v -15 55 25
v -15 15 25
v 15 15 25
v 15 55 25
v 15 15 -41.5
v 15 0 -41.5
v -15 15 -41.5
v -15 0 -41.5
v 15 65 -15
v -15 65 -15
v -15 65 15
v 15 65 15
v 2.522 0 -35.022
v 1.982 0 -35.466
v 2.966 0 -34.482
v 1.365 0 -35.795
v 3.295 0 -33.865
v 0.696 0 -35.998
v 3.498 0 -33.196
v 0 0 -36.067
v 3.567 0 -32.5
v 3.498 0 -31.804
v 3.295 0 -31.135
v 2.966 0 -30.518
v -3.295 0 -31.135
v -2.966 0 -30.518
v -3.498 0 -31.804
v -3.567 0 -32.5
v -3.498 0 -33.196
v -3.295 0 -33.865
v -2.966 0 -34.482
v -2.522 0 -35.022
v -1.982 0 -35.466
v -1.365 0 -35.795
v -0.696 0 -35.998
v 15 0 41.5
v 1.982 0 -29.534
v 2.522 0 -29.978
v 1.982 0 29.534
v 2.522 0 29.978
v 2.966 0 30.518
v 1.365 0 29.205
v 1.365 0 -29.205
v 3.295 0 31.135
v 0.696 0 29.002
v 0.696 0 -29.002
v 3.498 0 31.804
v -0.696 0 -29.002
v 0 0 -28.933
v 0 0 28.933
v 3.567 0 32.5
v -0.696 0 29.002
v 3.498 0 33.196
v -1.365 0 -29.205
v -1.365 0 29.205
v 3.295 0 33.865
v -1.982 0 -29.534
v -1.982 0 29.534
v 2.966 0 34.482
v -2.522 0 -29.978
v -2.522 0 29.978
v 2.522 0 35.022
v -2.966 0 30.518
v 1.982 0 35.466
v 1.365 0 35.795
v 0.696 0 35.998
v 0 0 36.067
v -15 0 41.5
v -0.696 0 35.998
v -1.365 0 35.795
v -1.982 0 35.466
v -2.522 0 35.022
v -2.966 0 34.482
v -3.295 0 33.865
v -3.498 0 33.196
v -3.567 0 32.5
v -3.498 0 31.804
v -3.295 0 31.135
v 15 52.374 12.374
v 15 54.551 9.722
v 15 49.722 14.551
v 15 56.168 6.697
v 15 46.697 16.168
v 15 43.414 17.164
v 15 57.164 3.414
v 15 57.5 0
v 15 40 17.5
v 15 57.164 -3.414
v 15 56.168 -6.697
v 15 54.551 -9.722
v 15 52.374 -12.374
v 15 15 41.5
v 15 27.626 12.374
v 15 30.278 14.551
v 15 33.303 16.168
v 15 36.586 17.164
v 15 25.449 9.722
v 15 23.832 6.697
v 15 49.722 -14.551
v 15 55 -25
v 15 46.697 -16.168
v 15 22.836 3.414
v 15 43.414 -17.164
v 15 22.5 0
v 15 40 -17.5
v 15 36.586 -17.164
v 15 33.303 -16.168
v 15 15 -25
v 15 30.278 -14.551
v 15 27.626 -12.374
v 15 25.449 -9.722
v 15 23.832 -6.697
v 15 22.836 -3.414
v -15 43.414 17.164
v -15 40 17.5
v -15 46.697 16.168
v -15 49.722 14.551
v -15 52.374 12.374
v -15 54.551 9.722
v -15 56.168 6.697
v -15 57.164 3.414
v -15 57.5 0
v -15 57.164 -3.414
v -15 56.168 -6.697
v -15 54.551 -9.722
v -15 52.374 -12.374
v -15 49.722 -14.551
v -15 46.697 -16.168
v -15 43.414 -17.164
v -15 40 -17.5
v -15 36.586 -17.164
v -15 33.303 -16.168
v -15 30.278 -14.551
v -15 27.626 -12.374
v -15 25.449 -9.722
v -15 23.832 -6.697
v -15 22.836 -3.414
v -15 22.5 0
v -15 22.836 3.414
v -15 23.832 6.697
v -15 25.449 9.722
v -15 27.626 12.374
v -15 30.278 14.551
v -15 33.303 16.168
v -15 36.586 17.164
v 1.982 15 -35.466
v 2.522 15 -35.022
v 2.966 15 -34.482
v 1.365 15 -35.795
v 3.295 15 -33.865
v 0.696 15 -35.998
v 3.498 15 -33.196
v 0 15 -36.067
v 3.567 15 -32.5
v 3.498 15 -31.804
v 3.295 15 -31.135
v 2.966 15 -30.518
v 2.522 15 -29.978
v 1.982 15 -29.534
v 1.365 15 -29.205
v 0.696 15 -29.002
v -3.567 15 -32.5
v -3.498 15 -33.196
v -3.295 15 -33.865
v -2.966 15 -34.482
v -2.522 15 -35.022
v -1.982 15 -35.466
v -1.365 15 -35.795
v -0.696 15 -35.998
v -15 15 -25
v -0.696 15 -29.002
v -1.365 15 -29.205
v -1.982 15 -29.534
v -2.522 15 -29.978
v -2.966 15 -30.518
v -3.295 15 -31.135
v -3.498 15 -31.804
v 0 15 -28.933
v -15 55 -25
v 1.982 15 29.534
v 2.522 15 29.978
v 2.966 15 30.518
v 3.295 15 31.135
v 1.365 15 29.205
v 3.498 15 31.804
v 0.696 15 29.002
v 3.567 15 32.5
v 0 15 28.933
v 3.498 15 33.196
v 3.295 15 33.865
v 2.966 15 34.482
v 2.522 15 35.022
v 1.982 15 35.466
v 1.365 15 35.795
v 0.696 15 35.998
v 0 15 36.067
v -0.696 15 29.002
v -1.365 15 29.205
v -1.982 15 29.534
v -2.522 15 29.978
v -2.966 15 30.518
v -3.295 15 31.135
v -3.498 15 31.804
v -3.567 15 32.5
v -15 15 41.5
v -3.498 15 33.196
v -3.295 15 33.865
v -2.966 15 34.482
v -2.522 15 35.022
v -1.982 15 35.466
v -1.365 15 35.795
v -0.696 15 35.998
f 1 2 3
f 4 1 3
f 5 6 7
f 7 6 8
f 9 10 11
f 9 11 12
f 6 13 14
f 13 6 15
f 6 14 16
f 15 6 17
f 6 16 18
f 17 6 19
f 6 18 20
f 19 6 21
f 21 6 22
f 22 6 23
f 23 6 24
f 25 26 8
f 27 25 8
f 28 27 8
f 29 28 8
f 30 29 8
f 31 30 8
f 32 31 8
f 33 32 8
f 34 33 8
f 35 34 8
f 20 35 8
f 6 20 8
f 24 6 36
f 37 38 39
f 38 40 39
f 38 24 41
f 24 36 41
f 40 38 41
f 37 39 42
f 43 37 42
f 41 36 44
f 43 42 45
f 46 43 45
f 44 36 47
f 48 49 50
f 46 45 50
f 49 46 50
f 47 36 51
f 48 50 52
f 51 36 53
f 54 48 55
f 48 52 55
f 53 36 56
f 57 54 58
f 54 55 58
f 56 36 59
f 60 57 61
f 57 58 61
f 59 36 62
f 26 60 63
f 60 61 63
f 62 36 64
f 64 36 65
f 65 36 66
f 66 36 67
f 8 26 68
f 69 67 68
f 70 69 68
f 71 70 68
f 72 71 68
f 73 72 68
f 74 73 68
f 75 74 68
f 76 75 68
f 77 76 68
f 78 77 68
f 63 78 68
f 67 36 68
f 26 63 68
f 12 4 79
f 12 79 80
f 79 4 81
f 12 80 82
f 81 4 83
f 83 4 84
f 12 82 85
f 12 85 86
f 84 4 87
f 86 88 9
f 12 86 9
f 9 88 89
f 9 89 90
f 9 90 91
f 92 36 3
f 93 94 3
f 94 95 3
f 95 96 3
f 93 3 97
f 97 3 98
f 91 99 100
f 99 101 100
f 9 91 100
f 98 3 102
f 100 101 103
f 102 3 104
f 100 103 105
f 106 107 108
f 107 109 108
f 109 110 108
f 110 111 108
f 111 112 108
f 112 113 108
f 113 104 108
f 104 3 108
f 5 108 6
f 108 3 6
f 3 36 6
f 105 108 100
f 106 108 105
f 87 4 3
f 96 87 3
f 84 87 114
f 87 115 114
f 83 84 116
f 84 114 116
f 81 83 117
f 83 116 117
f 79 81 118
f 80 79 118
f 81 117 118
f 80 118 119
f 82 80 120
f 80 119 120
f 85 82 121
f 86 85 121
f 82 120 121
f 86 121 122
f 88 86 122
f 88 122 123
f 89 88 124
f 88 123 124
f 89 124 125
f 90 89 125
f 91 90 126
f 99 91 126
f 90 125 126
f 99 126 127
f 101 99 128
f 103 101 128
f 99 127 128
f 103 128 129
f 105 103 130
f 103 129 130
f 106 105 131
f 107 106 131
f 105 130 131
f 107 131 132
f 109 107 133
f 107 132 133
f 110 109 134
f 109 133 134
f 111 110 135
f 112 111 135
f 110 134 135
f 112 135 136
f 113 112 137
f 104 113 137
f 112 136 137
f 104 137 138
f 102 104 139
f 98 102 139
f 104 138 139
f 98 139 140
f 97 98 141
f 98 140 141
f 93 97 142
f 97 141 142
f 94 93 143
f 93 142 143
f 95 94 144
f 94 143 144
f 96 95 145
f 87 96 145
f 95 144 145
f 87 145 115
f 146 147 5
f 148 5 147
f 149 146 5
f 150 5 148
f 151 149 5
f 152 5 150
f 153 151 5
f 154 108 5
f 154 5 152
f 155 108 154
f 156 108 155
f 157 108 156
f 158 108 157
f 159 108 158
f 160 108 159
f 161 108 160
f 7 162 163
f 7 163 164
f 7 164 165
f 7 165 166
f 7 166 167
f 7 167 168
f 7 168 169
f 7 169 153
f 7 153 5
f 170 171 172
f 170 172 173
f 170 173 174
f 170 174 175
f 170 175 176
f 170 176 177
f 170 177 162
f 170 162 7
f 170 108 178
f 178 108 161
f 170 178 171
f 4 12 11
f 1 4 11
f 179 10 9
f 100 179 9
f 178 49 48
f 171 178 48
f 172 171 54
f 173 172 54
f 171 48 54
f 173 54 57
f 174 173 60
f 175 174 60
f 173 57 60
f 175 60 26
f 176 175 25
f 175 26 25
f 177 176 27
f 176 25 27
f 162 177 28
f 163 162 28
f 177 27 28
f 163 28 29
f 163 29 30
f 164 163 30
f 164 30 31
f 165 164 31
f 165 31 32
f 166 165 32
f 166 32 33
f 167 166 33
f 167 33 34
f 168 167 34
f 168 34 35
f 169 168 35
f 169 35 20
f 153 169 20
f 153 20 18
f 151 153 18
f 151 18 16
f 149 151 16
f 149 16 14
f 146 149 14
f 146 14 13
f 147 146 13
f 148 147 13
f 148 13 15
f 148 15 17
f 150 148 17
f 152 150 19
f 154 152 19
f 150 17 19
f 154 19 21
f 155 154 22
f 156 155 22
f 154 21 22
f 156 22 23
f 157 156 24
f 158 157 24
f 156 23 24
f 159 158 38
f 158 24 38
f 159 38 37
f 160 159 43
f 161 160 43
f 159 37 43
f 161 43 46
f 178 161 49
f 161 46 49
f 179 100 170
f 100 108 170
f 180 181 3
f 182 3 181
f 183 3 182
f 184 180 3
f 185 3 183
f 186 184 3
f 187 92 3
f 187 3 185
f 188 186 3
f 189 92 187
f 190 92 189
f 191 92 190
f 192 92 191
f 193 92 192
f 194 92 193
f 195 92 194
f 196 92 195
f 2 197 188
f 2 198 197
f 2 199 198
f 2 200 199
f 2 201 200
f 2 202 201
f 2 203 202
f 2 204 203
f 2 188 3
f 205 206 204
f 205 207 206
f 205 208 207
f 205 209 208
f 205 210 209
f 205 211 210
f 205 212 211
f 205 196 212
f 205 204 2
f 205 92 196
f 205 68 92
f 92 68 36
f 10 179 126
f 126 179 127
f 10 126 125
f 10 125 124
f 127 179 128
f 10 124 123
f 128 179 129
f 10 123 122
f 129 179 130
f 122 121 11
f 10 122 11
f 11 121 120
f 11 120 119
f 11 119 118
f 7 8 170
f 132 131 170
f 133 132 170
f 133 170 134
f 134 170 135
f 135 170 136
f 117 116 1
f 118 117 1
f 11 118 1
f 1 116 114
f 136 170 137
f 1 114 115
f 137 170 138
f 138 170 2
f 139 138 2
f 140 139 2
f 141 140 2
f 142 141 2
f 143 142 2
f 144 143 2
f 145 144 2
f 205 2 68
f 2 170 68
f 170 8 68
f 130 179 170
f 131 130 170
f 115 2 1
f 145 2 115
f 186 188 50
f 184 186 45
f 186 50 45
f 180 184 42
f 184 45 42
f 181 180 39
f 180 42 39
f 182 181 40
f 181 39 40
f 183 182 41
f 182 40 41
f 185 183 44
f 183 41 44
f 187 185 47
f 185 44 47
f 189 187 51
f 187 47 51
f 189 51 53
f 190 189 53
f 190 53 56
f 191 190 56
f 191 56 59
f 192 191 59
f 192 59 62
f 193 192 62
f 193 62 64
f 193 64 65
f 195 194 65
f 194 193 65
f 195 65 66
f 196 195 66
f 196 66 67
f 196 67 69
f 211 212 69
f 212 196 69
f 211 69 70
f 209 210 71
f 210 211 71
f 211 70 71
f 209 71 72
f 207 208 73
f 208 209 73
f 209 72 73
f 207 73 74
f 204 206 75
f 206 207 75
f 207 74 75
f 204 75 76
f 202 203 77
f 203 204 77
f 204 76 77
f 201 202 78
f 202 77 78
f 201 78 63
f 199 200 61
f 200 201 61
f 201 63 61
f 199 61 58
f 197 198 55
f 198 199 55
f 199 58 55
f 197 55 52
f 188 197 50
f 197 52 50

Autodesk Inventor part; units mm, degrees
ref_plane "YZ Plane" through (0, 0, 0) normal (1, 0, 0) x (0, 1, 0)
ref_plane "XZ Plane" through (0, 0, 0) normal (0, 1, 0) x (-1, 0, 0)
ref_plane "XY Plane" through (0, 0, 0) normal (0, 0, 1) x (1, 0, 0)
sketch "Sketch1" plane through (0, 0, 0) normal (0, 1, 0) x (-1, 0, 0)
  line L0 (-15, -41.5) -> (15, -41.5)
  line L1 (15, -41.5) -> (15, 41.5)
  line L2 (15, 41.5) -> (-15, 41.5)
  line L3 (-15, 41.5) -> (-15, -41.5)
  line L4 (-15, -41.5) -> (15, 41.5) construction
  line L5 (15, -41.5) -> (-15, 41.5) construction
  point P0 (0, 0)
  dimension "d0" = 30
  dimension "d1" = 83
extrude "Extrusion1" add sketch "Sketch1" along normal blind 15
sketch "Sketch2" plane through (0, 15, 0) normal (0, 1, 0) x (1, 0, 0)
  line L0 (-15, 41.5) -> (-15, -41.5) projected
  line L1 (15, 25) -> (-15, 25)
  line L2 (-15, 25) -> (-15, -25)
  line L3 (-15, -25) -> (15, -25)
  line L4 (15, -25) -> (15, 25)
  line L5 (15, 25) -> (-15, -25) construction
  line L6 (-15, 25) -> (15, -25) construction
  point P0 (0, 0)
  point P1 (-15, 25)
  dimension "d4" = 50
extrude "Extrusion2" add sketch "Sketch2" along normal blind 50
chamfer "Chamfer1" distance 10 angle 45 2 edges at (0, 65, 25) (0, 65, -25)
sketch "Sketch3" plane through (0, 15, 0) normal (0, 1, 0) x (1, 0, 0)
  line L0 (-15, 41.5) -> (-15, 25) projected
  line L1 (15, 41.5) -> (-15, 41.5) projected
  point P0 (0, 0)
  point P1 (0, 32.5)
  point P2 (-15, 33.25)
  dimension "d10" = 15
  dimension "d11" = 9
hole "Hole1" at (0, 15, -32.5) direction (0, -1, 0) diameter 7.134 end through all thread size "M8x0.8" class "6H" standard "ISO Metric profile"
mirror "Mirror1" about plane through (0, 0, 0) normal (0, 0, 1) of "Hole1"
sketch "Sketch4" plane through (-15, 0, -41.5) normal (-1, 0, 0) x (0, 0, 1)
  circle A0 centre (41.5, 40) radius 17.5
  line L0 (26.5, 65) -> (56.5, 65) projected
  line L1 (66.5, 15) -> (66.5, 55) projected
  point P0 (41.5, 0)
  dimension "d19" = 35
  dimension "d20" = 25
  dimension "d21" = 25
extrude "Extrusion3" cut sketch "Sketch4" against normal blind 50
properties part number "Pillow_block" material "Brass, Soft Yellow"
